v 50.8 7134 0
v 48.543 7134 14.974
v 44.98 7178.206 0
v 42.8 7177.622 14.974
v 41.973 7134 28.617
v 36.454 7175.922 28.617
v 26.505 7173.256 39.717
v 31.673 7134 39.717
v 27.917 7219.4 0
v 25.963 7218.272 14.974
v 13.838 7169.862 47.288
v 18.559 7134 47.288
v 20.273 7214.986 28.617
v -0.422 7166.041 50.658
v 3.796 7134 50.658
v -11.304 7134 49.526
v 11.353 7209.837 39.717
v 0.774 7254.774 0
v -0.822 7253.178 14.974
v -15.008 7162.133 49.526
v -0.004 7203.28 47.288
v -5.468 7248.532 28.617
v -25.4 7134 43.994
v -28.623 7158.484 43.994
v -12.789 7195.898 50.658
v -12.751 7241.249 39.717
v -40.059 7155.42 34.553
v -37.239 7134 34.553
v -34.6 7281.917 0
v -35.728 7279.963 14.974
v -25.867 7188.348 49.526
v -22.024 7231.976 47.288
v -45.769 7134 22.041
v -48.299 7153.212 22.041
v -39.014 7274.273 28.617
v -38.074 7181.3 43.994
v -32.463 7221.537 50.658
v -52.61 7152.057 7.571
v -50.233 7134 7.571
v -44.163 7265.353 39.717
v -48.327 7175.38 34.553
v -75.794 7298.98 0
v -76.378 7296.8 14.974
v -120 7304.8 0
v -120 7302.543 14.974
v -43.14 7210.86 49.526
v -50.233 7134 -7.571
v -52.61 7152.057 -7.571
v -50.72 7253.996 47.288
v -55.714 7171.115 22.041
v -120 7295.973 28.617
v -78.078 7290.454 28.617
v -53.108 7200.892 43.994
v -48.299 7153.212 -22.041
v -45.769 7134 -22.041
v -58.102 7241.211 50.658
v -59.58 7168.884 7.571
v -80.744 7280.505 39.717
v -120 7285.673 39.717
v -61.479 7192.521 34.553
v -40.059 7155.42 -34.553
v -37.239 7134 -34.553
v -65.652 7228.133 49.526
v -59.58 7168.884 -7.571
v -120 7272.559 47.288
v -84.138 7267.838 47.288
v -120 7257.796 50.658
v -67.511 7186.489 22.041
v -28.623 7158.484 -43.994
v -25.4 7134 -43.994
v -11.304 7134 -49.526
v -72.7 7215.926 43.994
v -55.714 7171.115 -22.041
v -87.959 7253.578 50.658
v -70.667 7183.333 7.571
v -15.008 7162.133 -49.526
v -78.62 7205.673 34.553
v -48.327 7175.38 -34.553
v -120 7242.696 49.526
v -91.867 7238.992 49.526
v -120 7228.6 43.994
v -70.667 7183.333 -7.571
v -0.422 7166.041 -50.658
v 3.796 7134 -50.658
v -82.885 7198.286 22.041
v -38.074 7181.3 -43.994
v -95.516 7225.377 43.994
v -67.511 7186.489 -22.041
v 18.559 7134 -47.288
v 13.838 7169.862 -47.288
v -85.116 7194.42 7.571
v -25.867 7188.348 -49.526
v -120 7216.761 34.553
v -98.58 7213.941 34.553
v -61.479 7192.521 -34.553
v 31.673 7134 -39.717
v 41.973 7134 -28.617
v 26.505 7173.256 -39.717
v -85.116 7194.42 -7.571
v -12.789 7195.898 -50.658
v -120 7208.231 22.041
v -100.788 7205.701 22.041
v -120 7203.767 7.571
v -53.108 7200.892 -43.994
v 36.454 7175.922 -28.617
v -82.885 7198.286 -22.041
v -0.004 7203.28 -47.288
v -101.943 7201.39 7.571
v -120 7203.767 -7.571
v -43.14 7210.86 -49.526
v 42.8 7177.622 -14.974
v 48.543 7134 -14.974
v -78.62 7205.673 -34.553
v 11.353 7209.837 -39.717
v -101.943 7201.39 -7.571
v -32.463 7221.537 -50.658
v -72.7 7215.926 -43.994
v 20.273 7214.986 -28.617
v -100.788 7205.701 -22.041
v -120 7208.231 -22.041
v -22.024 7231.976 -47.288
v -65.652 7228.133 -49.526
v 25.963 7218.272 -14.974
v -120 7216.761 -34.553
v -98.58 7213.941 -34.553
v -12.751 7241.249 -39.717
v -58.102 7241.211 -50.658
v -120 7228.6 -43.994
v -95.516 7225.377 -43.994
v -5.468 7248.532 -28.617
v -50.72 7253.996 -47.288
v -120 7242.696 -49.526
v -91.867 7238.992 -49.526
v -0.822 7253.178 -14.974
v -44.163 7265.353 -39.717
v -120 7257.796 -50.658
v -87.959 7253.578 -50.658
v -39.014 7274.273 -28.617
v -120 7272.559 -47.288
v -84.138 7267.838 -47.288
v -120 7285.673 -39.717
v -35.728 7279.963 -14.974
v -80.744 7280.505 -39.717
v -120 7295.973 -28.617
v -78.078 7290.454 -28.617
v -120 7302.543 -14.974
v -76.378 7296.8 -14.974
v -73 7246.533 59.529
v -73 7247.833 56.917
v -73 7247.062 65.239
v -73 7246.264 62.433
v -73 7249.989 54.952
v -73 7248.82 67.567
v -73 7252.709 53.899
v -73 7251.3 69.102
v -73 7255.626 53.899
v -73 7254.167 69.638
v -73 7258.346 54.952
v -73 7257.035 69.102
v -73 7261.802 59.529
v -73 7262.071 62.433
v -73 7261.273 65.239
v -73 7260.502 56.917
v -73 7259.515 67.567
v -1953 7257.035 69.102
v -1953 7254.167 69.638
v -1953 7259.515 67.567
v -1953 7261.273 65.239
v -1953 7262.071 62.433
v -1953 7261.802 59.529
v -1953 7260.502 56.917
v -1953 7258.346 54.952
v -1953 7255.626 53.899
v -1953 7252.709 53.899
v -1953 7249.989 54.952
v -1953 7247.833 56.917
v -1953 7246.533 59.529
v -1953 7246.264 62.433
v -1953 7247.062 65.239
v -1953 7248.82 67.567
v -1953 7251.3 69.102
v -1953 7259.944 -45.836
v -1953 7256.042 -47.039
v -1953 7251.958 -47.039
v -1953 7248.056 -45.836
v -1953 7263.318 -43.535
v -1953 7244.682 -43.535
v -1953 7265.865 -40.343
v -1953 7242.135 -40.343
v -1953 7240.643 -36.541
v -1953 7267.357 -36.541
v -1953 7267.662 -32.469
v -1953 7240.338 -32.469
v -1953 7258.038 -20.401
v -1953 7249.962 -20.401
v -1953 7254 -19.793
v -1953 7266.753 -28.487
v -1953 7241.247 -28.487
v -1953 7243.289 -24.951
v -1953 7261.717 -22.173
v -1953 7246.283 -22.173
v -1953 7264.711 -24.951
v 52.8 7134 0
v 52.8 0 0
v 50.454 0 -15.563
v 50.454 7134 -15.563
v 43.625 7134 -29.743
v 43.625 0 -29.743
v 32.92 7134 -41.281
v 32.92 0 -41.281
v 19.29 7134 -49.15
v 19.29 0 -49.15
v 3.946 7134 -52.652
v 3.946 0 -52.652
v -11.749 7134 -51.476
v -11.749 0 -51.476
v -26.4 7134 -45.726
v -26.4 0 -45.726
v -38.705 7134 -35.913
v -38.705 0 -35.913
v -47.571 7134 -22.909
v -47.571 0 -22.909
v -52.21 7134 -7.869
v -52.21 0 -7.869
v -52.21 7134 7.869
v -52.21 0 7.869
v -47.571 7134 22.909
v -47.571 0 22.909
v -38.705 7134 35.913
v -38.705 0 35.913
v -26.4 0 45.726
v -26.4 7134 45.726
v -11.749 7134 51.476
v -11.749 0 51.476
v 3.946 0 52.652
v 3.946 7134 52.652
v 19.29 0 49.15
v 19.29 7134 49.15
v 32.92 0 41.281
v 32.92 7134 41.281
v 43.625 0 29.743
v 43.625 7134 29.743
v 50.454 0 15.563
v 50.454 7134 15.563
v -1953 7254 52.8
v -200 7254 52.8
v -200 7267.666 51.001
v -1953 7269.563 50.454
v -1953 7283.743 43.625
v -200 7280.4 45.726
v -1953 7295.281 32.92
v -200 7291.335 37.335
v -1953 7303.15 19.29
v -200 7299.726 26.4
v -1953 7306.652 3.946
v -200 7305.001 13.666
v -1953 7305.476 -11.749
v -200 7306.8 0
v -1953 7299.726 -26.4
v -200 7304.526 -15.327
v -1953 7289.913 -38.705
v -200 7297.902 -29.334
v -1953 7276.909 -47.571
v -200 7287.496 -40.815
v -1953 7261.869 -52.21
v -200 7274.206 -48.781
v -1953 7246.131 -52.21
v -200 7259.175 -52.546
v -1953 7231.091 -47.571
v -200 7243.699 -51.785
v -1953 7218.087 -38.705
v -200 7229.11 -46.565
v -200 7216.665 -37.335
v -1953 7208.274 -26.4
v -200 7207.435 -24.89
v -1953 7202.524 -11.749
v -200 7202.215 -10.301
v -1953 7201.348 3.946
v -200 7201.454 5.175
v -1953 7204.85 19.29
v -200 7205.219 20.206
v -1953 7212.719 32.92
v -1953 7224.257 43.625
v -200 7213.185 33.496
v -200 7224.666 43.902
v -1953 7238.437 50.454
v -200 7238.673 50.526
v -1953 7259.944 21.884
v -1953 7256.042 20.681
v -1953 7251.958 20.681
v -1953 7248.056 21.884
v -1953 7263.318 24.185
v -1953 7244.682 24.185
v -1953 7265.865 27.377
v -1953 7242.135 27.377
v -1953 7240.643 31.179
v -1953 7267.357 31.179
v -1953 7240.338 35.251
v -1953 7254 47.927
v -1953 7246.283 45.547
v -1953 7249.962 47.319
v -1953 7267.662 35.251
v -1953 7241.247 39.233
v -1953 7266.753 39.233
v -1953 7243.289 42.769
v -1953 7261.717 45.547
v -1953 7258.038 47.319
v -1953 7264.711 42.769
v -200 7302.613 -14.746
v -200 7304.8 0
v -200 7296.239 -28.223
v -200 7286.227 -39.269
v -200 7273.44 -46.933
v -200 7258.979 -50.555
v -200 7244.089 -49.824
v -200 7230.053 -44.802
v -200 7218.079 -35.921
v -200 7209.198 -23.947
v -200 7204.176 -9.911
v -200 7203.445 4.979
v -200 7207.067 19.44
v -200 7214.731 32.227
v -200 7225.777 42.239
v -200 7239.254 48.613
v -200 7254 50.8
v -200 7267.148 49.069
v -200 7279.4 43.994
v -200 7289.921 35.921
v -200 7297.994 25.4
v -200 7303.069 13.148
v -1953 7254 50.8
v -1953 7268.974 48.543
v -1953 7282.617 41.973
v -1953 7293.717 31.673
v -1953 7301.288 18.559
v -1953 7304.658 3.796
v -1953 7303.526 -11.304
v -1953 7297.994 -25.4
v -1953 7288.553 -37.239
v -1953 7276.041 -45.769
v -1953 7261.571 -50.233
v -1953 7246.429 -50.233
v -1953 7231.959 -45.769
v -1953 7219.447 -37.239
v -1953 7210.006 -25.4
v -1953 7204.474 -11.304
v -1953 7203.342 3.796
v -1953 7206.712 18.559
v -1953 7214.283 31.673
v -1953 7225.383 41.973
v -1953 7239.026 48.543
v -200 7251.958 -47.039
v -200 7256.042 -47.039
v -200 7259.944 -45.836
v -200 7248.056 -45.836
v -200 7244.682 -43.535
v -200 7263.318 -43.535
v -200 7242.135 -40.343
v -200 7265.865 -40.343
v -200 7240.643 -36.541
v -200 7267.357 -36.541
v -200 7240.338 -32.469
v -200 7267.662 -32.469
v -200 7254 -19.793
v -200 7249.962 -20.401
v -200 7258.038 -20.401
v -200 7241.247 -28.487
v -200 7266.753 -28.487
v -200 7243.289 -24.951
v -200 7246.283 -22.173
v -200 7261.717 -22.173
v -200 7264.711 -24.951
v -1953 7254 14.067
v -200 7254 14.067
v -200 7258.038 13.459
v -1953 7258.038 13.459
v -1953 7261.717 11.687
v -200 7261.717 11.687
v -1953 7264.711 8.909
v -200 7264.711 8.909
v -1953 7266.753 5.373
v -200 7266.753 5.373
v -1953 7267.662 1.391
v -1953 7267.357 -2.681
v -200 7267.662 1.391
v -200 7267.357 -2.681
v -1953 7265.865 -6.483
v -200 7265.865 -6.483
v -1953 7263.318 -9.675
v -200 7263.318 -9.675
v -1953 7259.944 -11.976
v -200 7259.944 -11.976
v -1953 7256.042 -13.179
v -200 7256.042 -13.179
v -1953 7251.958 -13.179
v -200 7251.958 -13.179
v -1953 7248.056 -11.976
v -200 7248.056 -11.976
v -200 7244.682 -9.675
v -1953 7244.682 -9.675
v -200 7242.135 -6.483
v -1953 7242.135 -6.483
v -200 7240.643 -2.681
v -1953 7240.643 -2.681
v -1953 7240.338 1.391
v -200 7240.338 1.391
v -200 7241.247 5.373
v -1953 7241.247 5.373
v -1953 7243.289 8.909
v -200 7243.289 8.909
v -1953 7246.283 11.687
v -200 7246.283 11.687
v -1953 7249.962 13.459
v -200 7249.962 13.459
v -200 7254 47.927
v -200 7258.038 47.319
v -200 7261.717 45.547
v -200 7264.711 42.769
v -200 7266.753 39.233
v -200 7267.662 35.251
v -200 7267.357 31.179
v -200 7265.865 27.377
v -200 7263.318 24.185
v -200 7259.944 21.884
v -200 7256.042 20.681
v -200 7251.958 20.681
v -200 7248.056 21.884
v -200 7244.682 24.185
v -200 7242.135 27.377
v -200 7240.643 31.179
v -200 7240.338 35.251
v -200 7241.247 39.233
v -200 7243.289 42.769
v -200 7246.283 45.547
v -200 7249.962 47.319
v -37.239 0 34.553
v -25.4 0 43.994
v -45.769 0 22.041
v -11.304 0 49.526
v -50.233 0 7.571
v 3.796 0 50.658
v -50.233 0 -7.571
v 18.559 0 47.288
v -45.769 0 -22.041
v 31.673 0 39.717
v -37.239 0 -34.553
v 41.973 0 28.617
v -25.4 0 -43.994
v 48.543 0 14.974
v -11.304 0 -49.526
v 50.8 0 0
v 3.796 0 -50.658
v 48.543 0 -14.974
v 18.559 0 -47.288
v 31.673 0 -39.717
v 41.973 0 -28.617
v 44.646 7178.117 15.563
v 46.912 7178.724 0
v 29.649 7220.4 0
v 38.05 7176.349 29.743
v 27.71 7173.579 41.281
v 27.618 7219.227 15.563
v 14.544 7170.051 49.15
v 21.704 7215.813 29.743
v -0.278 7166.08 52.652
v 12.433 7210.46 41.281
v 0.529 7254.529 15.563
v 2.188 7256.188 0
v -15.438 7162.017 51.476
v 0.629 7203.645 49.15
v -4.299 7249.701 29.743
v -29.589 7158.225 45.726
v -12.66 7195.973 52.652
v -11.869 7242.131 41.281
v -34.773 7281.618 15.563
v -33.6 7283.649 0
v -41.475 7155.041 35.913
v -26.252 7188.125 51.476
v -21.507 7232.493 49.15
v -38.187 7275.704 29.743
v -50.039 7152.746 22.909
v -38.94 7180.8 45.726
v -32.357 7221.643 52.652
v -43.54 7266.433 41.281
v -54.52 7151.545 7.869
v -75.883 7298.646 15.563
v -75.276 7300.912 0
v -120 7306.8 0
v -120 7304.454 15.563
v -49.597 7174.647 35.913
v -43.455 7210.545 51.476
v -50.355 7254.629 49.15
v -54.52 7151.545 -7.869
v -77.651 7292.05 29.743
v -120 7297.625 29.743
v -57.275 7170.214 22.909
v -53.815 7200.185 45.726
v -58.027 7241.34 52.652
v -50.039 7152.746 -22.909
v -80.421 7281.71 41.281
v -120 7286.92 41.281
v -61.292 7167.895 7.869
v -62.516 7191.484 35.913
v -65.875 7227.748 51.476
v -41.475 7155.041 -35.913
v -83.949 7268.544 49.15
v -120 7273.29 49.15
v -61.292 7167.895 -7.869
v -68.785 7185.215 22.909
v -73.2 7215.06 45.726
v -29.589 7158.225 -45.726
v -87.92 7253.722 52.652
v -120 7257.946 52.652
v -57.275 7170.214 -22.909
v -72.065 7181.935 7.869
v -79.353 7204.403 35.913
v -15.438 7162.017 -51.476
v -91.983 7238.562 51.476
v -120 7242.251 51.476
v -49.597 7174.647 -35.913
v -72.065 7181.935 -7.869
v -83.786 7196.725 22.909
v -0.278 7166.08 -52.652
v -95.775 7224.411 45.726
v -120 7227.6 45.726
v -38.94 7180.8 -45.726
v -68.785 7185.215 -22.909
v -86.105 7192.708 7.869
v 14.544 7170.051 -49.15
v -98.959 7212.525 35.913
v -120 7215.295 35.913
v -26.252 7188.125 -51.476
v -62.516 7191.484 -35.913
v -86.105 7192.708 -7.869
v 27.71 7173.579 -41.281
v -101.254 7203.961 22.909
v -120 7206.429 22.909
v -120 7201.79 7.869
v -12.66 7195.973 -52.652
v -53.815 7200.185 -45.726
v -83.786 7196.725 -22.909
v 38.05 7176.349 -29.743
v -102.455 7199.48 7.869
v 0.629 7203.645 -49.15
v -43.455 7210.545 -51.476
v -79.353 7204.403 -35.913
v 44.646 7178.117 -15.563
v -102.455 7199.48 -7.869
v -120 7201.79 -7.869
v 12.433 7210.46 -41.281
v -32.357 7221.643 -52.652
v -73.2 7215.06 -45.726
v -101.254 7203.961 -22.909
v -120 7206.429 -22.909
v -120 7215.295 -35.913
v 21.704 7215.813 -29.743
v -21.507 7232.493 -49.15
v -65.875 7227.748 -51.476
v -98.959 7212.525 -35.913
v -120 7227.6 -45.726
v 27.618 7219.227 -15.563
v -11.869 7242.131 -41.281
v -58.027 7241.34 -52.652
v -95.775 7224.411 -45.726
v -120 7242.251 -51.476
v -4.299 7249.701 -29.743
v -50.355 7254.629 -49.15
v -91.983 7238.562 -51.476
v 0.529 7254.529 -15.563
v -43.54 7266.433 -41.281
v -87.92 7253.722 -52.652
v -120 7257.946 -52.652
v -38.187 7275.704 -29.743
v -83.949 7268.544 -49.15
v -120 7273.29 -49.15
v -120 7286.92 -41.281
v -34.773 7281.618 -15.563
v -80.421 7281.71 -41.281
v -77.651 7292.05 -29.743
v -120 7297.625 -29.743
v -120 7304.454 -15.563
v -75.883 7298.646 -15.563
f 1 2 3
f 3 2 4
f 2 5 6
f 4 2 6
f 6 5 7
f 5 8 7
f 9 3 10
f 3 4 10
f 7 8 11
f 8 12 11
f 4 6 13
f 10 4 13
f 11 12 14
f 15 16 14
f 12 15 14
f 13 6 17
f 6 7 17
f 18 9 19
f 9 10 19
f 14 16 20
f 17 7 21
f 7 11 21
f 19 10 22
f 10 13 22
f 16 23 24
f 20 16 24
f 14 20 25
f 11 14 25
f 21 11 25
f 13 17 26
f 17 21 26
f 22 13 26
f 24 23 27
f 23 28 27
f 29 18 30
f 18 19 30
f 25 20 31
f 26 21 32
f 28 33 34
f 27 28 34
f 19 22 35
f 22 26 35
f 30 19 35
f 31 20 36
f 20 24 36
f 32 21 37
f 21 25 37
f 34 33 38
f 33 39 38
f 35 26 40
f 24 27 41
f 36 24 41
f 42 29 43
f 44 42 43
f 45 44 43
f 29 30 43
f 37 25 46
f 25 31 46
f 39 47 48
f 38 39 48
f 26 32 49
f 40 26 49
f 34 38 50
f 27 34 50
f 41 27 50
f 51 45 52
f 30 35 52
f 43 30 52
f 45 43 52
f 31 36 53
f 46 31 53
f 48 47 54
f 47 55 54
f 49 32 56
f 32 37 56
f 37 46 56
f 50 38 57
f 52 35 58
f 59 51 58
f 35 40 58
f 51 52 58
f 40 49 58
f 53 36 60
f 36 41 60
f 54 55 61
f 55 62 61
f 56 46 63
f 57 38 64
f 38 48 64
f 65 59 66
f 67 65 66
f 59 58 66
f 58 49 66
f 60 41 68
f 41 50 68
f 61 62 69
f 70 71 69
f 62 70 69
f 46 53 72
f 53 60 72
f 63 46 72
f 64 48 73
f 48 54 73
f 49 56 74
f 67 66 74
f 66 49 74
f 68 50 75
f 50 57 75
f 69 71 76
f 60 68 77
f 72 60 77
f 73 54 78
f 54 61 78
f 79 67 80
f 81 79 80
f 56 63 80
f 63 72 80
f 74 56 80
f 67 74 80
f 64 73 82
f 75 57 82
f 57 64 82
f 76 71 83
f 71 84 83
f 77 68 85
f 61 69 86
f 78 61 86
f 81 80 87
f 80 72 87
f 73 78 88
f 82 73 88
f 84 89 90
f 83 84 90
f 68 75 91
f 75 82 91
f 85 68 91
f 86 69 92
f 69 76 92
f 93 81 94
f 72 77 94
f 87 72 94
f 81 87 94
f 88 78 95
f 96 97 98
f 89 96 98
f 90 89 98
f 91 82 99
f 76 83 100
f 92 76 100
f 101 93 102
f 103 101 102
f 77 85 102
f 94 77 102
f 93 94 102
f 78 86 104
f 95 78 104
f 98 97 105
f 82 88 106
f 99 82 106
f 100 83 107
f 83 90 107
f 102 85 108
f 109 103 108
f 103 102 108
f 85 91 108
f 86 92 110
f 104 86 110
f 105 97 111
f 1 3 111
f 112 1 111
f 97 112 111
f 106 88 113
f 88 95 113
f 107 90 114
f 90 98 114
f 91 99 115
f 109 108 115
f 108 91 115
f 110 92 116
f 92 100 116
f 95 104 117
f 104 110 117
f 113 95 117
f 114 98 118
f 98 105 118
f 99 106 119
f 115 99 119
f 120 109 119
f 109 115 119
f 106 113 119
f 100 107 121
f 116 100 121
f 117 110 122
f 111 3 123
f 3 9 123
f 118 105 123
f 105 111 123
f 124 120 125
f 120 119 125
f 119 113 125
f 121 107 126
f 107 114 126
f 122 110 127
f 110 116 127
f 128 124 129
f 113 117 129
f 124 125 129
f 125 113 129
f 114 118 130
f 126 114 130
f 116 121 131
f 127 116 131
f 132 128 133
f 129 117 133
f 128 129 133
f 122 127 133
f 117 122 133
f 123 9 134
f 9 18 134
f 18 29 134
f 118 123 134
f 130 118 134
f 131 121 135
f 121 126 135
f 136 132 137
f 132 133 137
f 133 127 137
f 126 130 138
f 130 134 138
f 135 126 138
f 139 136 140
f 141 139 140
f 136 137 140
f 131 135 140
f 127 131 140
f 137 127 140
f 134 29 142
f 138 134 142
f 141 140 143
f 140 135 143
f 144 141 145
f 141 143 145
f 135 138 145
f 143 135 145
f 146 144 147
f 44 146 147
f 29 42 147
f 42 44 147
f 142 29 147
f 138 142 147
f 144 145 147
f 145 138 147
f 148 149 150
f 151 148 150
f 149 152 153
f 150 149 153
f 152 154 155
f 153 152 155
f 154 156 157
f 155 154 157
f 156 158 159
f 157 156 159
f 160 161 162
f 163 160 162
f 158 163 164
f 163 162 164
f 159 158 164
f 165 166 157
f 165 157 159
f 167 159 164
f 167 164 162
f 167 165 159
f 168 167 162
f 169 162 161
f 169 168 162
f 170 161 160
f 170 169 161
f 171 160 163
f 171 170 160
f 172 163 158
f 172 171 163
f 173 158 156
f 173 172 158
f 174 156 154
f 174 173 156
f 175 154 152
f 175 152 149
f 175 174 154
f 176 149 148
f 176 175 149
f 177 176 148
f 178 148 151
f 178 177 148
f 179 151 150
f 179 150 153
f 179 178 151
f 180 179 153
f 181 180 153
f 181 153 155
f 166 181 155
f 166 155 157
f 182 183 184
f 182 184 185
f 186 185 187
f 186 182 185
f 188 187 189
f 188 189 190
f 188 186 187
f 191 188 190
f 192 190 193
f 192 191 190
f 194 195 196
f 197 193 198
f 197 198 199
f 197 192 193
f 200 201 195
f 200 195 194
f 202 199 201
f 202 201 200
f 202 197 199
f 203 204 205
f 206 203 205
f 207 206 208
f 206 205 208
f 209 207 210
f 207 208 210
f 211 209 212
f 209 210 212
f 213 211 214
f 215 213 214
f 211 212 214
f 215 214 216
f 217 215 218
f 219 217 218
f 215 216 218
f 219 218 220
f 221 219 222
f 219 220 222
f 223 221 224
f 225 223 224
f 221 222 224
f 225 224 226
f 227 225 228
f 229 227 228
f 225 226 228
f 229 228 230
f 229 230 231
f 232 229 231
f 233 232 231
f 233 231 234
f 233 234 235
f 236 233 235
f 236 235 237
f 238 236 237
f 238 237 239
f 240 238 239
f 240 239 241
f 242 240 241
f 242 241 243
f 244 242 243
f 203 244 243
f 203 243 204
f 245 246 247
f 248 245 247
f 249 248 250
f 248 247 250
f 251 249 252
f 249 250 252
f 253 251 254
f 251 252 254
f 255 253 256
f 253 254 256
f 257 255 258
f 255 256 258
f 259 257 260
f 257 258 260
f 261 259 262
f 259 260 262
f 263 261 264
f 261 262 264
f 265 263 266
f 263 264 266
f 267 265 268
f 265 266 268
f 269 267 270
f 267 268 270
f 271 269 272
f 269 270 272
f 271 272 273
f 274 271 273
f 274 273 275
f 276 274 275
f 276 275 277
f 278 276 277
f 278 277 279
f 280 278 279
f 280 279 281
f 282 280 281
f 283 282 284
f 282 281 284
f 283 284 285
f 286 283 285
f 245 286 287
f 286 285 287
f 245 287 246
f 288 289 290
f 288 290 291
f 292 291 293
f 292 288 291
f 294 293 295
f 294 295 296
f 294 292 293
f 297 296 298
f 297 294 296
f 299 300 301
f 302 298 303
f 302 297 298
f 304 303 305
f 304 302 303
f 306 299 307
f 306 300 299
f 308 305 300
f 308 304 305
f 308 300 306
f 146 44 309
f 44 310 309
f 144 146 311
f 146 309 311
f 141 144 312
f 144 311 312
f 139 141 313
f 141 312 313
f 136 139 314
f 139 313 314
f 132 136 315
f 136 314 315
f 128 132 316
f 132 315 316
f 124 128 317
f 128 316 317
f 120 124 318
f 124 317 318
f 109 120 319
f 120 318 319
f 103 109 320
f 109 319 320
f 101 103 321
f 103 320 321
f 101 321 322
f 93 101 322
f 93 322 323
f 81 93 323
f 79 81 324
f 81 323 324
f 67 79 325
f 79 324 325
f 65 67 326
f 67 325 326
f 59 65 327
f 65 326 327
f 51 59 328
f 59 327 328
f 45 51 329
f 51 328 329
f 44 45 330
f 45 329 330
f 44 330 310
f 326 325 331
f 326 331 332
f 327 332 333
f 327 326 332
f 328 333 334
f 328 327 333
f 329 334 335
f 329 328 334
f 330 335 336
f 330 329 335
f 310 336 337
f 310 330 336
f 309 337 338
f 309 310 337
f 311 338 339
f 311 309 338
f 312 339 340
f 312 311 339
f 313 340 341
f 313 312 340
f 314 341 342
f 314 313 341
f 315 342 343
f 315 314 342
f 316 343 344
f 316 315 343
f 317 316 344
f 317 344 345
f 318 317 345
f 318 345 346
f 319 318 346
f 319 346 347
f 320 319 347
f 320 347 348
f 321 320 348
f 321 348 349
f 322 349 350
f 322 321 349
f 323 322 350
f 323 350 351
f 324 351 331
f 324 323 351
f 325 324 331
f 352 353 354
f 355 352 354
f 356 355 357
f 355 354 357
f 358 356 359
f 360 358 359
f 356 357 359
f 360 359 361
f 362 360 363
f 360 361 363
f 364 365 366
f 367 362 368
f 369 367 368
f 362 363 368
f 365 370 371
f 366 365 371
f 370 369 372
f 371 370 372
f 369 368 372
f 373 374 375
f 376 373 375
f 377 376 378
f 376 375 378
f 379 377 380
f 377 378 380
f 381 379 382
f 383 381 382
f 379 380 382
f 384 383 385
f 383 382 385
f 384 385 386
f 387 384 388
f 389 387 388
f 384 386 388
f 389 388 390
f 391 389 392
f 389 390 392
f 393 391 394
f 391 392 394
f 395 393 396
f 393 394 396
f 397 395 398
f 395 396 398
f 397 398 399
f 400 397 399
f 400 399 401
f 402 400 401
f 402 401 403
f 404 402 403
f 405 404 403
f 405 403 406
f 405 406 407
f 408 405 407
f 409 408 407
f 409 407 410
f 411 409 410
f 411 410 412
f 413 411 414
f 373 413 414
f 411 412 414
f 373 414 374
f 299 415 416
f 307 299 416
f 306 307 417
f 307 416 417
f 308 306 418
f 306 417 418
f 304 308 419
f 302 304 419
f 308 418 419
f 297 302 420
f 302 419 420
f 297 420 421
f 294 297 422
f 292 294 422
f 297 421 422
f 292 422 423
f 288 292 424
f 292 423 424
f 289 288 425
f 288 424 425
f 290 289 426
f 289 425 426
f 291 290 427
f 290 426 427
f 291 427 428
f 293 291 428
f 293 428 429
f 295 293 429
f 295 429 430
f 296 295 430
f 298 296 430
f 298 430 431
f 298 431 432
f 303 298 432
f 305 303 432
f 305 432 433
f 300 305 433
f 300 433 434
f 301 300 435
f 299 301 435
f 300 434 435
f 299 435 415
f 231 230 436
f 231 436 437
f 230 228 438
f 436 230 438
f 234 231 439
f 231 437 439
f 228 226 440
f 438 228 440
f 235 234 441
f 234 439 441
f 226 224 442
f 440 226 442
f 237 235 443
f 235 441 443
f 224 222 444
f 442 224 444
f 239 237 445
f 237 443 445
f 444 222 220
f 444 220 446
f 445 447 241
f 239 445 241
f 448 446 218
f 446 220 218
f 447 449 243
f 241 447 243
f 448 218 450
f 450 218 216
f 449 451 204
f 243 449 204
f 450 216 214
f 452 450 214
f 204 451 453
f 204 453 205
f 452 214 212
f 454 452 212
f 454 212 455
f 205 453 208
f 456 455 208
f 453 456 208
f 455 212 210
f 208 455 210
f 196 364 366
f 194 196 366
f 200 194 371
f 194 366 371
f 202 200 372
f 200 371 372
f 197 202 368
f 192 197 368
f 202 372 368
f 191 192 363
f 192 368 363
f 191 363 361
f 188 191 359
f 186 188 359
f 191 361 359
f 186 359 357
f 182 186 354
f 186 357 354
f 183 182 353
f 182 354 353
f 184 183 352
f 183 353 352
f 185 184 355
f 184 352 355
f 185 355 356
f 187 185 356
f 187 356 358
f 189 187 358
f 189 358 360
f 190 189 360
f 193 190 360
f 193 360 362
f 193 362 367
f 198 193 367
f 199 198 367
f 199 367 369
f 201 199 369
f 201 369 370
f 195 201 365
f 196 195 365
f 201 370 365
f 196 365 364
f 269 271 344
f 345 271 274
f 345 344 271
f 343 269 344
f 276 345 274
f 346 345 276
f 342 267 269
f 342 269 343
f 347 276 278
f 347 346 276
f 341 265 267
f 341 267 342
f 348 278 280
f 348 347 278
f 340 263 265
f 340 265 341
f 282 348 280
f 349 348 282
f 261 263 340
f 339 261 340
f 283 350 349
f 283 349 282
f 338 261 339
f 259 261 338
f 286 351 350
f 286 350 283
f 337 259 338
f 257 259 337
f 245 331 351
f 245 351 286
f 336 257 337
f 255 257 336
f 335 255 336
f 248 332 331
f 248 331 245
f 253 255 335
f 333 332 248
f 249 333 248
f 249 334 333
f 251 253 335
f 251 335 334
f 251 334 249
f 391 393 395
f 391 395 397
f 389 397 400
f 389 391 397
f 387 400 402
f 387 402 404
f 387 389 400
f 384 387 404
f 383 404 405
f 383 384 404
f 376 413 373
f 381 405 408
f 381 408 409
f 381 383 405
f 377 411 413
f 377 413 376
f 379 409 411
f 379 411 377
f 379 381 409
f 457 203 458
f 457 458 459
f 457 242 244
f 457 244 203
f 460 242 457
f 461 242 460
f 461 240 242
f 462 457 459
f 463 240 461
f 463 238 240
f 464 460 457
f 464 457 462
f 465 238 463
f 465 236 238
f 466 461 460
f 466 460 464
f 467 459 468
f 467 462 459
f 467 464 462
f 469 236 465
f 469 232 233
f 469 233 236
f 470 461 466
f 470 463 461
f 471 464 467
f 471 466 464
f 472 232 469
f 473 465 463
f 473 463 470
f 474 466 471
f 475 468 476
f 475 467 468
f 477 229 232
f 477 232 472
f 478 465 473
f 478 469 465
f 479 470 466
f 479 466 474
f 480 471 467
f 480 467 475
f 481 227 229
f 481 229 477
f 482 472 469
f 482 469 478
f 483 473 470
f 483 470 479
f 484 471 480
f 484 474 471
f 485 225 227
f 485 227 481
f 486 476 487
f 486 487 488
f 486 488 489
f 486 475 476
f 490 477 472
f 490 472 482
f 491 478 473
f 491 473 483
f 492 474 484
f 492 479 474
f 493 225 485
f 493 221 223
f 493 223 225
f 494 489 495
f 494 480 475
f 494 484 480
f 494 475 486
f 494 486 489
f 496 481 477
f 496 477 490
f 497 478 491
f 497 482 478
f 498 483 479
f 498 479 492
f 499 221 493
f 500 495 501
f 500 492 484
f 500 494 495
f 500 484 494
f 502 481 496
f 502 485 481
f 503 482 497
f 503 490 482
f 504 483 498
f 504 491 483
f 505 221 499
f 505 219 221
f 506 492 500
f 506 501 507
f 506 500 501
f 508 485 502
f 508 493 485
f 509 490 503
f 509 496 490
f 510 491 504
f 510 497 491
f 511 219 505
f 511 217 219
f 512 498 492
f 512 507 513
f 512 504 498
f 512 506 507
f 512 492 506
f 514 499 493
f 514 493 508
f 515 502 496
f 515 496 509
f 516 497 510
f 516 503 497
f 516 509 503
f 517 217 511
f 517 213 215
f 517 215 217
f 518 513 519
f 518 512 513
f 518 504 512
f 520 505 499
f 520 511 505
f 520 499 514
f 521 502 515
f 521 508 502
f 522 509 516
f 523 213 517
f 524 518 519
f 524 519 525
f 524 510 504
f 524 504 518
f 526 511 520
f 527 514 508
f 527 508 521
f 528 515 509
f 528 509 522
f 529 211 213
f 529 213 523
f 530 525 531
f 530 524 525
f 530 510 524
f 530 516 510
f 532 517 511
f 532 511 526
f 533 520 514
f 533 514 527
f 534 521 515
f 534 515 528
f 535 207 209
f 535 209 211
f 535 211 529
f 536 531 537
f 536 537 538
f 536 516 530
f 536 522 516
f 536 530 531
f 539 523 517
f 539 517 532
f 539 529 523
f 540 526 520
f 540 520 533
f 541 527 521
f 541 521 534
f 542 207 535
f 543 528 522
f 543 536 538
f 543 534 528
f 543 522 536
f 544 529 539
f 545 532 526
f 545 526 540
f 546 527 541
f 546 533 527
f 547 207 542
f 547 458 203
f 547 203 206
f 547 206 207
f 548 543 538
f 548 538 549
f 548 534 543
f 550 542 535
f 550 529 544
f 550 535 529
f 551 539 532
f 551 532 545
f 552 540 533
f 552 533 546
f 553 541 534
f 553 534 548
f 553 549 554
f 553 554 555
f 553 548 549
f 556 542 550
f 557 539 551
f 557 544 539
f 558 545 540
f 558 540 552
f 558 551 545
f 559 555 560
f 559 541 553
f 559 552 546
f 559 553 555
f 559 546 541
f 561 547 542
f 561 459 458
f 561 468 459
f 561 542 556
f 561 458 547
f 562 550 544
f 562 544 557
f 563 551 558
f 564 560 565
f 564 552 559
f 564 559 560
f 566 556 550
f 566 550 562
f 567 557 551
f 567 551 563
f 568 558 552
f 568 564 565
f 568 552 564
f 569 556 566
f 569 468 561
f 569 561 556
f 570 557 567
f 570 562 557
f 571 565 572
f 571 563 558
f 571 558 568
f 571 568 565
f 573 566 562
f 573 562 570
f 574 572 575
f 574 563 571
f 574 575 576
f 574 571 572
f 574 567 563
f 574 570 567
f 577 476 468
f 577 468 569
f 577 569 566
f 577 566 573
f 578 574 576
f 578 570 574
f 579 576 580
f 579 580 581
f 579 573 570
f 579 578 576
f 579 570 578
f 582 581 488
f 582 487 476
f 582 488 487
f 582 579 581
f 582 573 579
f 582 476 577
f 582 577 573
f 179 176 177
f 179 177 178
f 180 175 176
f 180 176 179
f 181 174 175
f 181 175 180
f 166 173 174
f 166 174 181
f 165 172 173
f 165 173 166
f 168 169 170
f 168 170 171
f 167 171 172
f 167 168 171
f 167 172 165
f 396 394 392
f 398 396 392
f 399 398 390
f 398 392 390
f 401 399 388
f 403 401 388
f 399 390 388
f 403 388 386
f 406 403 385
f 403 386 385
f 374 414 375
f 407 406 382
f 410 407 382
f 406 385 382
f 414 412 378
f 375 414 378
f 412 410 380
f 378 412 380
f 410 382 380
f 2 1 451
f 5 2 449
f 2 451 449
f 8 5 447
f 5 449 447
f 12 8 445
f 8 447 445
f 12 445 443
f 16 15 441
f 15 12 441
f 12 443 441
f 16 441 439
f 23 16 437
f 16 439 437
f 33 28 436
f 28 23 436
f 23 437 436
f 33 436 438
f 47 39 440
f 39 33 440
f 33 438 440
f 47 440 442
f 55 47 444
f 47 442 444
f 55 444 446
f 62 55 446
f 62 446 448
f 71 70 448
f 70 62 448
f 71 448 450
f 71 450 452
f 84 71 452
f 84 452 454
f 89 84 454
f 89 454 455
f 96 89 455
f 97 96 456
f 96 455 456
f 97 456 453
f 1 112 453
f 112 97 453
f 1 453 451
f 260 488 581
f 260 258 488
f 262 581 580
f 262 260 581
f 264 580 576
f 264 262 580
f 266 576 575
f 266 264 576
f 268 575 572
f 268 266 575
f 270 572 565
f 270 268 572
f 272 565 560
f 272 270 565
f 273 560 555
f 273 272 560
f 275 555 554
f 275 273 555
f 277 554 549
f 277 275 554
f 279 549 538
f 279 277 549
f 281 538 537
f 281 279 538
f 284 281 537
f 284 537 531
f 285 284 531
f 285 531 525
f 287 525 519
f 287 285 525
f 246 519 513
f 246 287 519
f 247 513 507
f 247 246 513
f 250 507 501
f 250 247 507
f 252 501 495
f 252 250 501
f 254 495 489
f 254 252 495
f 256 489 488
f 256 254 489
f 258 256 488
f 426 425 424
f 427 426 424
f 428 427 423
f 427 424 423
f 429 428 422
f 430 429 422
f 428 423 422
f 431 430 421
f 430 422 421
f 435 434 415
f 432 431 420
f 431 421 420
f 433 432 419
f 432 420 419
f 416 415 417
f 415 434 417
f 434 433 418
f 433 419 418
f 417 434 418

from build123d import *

# Parameters (mm, degrees)
CROQUIS1_R                = 52.8
SALIENTE_EXTRUIR2_DEPTH   = 10
CROQUIS3_R                = 52.8
CROQUIS3_R_2              = 50.8
CROQUIS4_R                = 13.7
SALIENTE_EXTRUIR3_DEPTH   = 1753
SALIENTE_EXTRUIR3_2_DEPTH = 1753
SALIENTE_EXTRUIR3_3_DEPTH = 1753
CROQUIS9_R                = 50.8
CORTAR_EXTRUIR1_DEPTH     = 100
CROQUIS11_R               = 52.8
CROQUIS11_R_2             = 50.8
SALIENTE_EXTRUIR4_DEPTH   = 1753
CROQUIS12_R               = 7.9375
SALIENTE_EXTRUIR5_DEPTH   = 1880


with BuildPart() as part:
    # Croquis1 → Saliente-Extruir2 (new body)
    with BuildSketch(Plane(origin=(0, 0, 0), x_dir=(1, 0, 0), z_dir=(0, 1, 0))):
        Circle(CROQUIS1_R)
    extrude(amount=SALIENTE_EXTRUIR2_DEPTH)

    # Barrer1: sweep along a curve in space
    with BuildLine() as barrer1_path:
        Line((0, 0, 0), (0, 7134, 0))
        ThreePointArc((0, 7134, 0), (-35.147186258, 7218.852813742, 0), (-120, 7254, 0))
        Line((-120, 7254, 0), (-200, 7254, 0))
    # Croquis3 → Barrer1 (sweep)
    with BuildSketch(Plane(origin=(0, 10, 0), x_dir=(1, 0, 0), z_dir=(0, 1, 0))):
        Circle(CROQUIS3_R)
        Circle(CROQUIS3_R_2, mode=Mode.SUBTRACT)
    sweep(path=barrer1_path.line)

    # Croquis9 → Cortar-Extruir1 (cut)
    with BuildSketch(Plane.XZ):
        Circle(CROQUIS9_R)
    extrude(amount=-CORTAR_EXTRUIR1_DEPTH, mode=Mode.SUBTRACT)

    # Croquis11 → Saliente-Extruir4 (add)
    with BuildSketch(Plane.ZY.offset(200)):
        with Locations((0, 7254)):
            Circle(CROQUIS11_R)
        with Locations((0, 7254)):
            Circle(CROQUIS11_R_2, mode=Mode.SUBTRACT)
    extrude(amount=SALIENTE_EXTRUIR4_DEPTH)


with BuildPart() as body_2:
    # Croquis4 → Saliente-Extruir3 (new body)
    with BuildSketch(Plane.ZY.offset(200)):
        with Locations((34.227483109, 7254)):
            Circle(CROQUIS4_R)
    extrude(amount=SALIENTE_EXTRUIR3_DEPTH)


with BuildPart() as body_3:
    # Croquis4 → Saliente-Extruir3 2 (new body)
    with BuildSketch(Plane.ZY.offset(200)):
        with Locations((0.367483109, 7254)):
            Circle(CROQUIS4_R)
    extrude(amount=SALIENTE_EXTRUIR3_2_DEPTH)


with BuildPart() as body_4:
    # Croquis4 → Saliente-Extruir3 3 (new body)
    with BuildSketch(Plane.ZY.offset(200)):
        with Locations((-33.492516891, 7254)):
            Circle(CROQUIS4_R)
    extrude(amount=SALIENTE_EXTRUIR3_3_DEPTH)


with BuildPart() as body_5:
    # Croquis12 → Saliente-Extruir5 (new body)
    with BuildSketch(Plane.ZY.offset(1953)):
        with Locations((61.700865987, 7254.167370401)):
            Circle(CROQUIS12_R)
    extrude(amount=-SALIENTE_EXTRUIR5_DEPTH)


solid = Compound([part.part, body_2.part, body_3.part, body_4.part, body_5.part])
